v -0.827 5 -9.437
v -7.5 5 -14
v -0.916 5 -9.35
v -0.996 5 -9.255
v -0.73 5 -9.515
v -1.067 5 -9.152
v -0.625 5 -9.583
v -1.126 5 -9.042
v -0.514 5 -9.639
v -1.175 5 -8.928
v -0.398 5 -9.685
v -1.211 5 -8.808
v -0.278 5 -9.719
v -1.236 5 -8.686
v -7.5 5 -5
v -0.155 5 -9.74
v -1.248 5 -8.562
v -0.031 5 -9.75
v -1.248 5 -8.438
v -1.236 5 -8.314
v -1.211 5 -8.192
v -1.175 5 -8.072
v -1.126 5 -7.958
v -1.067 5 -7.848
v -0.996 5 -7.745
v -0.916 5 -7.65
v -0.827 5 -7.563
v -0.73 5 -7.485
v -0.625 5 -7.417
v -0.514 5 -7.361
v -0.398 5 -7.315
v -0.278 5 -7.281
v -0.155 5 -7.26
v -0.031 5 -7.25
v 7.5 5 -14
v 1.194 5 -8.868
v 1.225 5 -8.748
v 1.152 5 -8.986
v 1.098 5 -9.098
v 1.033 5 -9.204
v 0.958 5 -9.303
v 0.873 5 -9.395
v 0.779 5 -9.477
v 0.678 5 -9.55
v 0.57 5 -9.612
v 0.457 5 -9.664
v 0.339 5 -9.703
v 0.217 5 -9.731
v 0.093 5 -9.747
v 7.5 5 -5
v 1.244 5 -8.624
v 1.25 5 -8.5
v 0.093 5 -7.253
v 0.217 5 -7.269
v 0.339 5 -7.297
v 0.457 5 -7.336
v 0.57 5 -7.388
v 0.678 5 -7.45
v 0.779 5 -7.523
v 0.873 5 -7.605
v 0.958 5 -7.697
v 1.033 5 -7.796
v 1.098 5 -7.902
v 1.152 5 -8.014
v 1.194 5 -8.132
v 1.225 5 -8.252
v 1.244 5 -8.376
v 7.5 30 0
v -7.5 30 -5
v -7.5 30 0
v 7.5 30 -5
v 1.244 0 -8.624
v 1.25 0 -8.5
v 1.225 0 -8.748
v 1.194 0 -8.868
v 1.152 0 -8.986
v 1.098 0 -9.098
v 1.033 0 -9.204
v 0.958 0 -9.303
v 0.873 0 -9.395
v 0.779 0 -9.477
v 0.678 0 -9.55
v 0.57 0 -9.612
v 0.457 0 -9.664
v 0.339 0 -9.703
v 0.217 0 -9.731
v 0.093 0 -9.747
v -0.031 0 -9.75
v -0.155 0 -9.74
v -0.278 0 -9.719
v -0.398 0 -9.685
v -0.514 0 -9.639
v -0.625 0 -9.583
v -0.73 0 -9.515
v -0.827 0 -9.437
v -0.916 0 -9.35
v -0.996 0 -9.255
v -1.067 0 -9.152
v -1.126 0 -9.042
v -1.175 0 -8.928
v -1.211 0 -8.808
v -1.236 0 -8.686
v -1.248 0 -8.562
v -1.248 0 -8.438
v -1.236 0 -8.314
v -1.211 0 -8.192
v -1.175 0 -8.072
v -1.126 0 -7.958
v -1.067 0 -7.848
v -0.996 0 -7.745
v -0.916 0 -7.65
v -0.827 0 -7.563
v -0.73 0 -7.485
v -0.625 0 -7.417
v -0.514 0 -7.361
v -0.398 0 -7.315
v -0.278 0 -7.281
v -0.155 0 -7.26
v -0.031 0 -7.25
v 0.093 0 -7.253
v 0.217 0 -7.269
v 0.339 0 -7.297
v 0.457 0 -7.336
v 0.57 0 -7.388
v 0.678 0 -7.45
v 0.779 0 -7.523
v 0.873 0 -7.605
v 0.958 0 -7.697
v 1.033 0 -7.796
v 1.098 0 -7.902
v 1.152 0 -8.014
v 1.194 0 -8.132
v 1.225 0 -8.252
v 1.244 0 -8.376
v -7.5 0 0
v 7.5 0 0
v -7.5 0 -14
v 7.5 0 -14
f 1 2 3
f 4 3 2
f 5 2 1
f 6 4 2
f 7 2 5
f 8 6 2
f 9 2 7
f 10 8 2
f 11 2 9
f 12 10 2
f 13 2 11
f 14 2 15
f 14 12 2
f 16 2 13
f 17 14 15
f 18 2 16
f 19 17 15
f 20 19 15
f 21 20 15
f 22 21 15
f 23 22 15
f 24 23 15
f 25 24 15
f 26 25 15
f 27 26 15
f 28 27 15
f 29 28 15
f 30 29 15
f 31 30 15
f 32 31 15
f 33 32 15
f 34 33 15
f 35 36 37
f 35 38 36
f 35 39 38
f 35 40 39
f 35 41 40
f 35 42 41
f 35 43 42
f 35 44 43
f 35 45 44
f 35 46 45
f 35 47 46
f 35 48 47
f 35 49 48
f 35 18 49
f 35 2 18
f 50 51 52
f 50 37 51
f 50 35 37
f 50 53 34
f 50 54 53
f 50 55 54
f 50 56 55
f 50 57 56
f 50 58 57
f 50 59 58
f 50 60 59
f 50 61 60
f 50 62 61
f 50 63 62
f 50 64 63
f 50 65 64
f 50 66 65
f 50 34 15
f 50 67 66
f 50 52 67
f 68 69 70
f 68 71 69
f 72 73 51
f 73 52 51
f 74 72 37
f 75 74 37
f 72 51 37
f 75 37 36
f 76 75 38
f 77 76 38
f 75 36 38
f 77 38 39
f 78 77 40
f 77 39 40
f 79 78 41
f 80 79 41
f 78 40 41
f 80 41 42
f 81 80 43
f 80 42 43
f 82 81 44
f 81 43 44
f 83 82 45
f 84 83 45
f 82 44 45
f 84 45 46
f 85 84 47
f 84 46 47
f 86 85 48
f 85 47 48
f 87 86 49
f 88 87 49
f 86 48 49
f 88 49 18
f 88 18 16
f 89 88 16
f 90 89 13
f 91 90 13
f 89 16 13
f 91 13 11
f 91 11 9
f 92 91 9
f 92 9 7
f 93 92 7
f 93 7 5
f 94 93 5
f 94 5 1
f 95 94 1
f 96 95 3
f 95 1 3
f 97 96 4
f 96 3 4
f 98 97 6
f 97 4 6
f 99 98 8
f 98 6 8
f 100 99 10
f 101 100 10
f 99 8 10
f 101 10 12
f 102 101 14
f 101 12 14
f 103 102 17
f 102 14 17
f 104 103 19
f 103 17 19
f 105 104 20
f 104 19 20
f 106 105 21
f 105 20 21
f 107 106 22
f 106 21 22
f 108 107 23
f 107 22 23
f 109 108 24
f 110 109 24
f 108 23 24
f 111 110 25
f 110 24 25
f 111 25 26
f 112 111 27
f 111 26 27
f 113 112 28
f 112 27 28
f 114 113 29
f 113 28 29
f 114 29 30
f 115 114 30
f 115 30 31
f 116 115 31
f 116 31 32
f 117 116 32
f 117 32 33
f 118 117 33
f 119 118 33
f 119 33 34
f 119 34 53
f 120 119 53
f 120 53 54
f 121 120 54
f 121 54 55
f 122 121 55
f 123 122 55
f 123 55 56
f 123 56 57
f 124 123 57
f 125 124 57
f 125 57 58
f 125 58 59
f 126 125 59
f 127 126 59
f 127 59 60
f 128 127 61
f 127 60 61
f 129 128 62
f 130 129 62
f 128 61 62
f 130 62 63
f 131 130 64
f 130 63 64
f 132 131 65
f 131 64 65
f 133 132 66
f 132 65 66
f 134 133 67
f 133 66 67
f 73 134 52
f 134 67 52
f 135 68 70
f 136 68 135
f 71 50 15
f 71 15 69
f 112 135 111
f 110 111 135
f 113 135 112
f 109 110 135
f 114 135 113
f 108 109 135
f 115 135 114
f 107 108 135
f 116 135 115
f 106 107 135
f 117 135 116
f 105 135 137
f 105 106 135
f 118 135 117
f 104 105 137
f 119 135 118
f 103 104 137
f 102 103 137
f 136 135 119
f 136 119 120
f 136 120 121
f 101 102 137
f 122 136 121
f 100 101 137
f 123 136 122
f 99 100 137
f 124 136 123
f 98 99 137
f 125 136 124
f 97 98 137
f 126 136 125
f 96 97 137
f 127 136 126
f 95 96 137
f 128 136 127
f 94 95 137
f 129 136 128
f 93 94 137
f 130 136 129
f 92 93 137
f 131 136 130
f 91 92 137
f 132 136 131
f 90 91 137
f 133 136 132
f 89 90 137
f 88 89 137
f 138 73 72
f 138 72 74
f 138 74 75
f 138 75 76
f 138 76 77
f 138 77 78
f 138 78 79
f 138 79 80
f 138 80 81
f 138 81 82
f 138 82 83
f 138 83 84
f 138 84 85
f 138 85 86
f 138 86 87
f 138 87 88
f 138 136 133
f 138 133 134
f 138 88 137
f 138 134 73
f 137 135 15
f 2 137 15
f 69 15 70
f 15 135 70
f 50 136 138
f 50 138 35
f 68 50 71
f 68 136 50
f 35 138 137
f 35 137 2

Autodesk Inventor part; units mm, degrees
ref_plane "YZ Plane" through (0, 0, 0) normal (1, 0, 0) x (0, 1, 0)
ref_plane "XZ Plane" through (0, 0, 0) normal (0, 1, 0) x (-1, 0, 0)
ref_plane "XY Plane" through (0, 0, 0) normal (0, 0, 1) x (1, 0, 0)
sketch "Sketch1" plane through (0, 0, 0) normal (1, 0, 0) x (0, 1, 0)
  line L0 (30, 0) -> (0, 0)
  line L1 (0, 0) -> (0, -14)
  line L2 (0, -14) -> (5, -14)
  line L3 (5, -14) -> (5, -5)
  line L4 (5, -5) -> (30, -5)
  line L5 (30, -5) -> (30, 0)
  dimension "d0" = 5
  dimension "d1" = 14
  dimension "d2" = 5
  dimension "d3" = 30
extrude "Extrusion1" add sketch "Sketch1" against normal mid plane 15
sketch "Sketch2" plane through (-7.5, 5, -14) normal (0, 1, 0) x (1, 0, 0)
  circle A0 centre (7.5, -5.5) radius 1.25
  line L0 (0, 0) -> (15, 0) projected
  line L1 (0, -14) -> (15, -14) projected
  line L2 (0, -9) -> (15, -9) projected
  point P0 (7.5, -14)
  point P1 (7.5, -14)
  dimension "d6" = 2.5
  dimension "d10" = 3.5
extrude "Extrusion2" cut sketch "Sketch2" against normal through all
properties part number "battery_fix_board"
